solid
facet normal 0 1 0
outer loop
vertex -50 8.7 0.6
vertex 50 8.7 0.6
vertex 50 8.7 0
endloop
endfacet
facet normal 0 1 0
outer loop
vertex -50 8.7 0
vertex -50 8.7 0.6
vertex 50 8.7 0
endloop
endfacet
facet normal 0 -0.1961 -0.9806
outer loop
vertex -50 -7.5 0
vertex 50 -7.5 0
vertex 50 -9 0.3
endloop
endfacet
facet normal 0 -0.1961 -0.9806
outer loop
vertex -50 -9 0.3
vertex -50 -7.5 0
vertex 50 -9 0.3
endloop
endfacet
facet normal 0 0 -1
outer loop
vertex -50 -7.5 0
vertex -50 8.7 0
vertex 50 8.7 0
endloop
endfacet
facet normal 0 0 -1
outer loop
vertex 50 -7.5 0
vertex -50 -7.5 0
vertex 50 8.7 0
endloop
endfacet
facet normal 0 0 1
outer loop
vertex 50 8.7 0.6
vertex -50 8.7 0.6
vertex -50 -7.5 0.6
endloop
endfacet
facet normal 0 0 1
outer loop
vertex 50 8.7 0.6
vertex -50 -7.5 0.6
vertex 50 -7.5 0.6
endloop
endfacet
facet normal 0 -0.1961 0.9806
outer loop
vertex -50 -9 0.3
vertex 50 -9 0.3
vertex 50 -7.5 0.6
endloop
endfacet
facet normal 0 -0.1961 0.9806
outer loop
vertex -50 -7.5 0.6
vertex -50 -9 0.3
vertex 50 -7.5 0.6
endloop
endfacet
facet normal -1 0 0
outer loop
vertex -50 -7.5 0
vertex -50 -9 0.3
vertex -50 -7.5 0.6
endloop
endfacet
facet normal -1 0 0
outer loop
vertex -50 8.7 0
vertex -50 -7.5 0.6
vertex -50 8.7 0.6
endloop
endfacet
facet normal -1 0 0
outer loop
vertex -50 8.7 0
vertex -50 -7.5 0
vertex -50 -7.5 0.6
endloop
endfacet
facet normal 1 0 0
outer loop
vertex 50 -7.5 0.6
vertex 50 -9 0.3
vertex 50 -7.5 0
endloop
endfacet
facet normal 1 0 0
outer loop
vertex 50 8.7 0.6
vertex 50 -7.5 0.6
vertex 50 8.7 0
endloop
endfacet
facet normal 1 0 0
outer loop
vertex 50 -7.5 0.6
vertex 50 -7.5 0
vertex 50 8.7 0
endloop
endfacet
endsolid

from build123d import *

# Parameters (mm, degrees)
ESBO_O1_W                = 100
ESBO_O1_H                = 18
RESSALTO_EXTRUS_O1_DEPTH = 0.6
ESBO_O2_W                = 0.6
ESBO_O2_H                = 0.3
CORTE_EXTRUS_O1_DEPTH    = 100


with BuildPart() as part:
    # Esboço1 → Ressalto-extrusão1 (new body)
    with BuildSketch(Plane.XY):
        Rectangle(ESBO_O1_W, ESBO_O1_H)
    extrude(amount=RESSALTO_EXTRUS_O1_DEPTH)

    # Esboço2 → Corte-extrusão1 (cut)
    with BuildSketch(Plane(origin=(50, 0, 0), x_dir=(0, 0, -1), z_dir=(1, 0, 0))):
        Polygon((-0.6, -9), (-0.3, -9), (-0.6, -7.5), align=None)
        Polygon((0, -7.5), (-0.3, -9), (0, -9), align=None)
        with Locations((-0.3, 8.85)):
            Rectangle(ESBO_O2_W, ESBO_O2_H)
    extrude(amount=-CORTE_EXTRUS_O1_DEPTH, mode=Mode.SUBTRACT)


solid = part.part
